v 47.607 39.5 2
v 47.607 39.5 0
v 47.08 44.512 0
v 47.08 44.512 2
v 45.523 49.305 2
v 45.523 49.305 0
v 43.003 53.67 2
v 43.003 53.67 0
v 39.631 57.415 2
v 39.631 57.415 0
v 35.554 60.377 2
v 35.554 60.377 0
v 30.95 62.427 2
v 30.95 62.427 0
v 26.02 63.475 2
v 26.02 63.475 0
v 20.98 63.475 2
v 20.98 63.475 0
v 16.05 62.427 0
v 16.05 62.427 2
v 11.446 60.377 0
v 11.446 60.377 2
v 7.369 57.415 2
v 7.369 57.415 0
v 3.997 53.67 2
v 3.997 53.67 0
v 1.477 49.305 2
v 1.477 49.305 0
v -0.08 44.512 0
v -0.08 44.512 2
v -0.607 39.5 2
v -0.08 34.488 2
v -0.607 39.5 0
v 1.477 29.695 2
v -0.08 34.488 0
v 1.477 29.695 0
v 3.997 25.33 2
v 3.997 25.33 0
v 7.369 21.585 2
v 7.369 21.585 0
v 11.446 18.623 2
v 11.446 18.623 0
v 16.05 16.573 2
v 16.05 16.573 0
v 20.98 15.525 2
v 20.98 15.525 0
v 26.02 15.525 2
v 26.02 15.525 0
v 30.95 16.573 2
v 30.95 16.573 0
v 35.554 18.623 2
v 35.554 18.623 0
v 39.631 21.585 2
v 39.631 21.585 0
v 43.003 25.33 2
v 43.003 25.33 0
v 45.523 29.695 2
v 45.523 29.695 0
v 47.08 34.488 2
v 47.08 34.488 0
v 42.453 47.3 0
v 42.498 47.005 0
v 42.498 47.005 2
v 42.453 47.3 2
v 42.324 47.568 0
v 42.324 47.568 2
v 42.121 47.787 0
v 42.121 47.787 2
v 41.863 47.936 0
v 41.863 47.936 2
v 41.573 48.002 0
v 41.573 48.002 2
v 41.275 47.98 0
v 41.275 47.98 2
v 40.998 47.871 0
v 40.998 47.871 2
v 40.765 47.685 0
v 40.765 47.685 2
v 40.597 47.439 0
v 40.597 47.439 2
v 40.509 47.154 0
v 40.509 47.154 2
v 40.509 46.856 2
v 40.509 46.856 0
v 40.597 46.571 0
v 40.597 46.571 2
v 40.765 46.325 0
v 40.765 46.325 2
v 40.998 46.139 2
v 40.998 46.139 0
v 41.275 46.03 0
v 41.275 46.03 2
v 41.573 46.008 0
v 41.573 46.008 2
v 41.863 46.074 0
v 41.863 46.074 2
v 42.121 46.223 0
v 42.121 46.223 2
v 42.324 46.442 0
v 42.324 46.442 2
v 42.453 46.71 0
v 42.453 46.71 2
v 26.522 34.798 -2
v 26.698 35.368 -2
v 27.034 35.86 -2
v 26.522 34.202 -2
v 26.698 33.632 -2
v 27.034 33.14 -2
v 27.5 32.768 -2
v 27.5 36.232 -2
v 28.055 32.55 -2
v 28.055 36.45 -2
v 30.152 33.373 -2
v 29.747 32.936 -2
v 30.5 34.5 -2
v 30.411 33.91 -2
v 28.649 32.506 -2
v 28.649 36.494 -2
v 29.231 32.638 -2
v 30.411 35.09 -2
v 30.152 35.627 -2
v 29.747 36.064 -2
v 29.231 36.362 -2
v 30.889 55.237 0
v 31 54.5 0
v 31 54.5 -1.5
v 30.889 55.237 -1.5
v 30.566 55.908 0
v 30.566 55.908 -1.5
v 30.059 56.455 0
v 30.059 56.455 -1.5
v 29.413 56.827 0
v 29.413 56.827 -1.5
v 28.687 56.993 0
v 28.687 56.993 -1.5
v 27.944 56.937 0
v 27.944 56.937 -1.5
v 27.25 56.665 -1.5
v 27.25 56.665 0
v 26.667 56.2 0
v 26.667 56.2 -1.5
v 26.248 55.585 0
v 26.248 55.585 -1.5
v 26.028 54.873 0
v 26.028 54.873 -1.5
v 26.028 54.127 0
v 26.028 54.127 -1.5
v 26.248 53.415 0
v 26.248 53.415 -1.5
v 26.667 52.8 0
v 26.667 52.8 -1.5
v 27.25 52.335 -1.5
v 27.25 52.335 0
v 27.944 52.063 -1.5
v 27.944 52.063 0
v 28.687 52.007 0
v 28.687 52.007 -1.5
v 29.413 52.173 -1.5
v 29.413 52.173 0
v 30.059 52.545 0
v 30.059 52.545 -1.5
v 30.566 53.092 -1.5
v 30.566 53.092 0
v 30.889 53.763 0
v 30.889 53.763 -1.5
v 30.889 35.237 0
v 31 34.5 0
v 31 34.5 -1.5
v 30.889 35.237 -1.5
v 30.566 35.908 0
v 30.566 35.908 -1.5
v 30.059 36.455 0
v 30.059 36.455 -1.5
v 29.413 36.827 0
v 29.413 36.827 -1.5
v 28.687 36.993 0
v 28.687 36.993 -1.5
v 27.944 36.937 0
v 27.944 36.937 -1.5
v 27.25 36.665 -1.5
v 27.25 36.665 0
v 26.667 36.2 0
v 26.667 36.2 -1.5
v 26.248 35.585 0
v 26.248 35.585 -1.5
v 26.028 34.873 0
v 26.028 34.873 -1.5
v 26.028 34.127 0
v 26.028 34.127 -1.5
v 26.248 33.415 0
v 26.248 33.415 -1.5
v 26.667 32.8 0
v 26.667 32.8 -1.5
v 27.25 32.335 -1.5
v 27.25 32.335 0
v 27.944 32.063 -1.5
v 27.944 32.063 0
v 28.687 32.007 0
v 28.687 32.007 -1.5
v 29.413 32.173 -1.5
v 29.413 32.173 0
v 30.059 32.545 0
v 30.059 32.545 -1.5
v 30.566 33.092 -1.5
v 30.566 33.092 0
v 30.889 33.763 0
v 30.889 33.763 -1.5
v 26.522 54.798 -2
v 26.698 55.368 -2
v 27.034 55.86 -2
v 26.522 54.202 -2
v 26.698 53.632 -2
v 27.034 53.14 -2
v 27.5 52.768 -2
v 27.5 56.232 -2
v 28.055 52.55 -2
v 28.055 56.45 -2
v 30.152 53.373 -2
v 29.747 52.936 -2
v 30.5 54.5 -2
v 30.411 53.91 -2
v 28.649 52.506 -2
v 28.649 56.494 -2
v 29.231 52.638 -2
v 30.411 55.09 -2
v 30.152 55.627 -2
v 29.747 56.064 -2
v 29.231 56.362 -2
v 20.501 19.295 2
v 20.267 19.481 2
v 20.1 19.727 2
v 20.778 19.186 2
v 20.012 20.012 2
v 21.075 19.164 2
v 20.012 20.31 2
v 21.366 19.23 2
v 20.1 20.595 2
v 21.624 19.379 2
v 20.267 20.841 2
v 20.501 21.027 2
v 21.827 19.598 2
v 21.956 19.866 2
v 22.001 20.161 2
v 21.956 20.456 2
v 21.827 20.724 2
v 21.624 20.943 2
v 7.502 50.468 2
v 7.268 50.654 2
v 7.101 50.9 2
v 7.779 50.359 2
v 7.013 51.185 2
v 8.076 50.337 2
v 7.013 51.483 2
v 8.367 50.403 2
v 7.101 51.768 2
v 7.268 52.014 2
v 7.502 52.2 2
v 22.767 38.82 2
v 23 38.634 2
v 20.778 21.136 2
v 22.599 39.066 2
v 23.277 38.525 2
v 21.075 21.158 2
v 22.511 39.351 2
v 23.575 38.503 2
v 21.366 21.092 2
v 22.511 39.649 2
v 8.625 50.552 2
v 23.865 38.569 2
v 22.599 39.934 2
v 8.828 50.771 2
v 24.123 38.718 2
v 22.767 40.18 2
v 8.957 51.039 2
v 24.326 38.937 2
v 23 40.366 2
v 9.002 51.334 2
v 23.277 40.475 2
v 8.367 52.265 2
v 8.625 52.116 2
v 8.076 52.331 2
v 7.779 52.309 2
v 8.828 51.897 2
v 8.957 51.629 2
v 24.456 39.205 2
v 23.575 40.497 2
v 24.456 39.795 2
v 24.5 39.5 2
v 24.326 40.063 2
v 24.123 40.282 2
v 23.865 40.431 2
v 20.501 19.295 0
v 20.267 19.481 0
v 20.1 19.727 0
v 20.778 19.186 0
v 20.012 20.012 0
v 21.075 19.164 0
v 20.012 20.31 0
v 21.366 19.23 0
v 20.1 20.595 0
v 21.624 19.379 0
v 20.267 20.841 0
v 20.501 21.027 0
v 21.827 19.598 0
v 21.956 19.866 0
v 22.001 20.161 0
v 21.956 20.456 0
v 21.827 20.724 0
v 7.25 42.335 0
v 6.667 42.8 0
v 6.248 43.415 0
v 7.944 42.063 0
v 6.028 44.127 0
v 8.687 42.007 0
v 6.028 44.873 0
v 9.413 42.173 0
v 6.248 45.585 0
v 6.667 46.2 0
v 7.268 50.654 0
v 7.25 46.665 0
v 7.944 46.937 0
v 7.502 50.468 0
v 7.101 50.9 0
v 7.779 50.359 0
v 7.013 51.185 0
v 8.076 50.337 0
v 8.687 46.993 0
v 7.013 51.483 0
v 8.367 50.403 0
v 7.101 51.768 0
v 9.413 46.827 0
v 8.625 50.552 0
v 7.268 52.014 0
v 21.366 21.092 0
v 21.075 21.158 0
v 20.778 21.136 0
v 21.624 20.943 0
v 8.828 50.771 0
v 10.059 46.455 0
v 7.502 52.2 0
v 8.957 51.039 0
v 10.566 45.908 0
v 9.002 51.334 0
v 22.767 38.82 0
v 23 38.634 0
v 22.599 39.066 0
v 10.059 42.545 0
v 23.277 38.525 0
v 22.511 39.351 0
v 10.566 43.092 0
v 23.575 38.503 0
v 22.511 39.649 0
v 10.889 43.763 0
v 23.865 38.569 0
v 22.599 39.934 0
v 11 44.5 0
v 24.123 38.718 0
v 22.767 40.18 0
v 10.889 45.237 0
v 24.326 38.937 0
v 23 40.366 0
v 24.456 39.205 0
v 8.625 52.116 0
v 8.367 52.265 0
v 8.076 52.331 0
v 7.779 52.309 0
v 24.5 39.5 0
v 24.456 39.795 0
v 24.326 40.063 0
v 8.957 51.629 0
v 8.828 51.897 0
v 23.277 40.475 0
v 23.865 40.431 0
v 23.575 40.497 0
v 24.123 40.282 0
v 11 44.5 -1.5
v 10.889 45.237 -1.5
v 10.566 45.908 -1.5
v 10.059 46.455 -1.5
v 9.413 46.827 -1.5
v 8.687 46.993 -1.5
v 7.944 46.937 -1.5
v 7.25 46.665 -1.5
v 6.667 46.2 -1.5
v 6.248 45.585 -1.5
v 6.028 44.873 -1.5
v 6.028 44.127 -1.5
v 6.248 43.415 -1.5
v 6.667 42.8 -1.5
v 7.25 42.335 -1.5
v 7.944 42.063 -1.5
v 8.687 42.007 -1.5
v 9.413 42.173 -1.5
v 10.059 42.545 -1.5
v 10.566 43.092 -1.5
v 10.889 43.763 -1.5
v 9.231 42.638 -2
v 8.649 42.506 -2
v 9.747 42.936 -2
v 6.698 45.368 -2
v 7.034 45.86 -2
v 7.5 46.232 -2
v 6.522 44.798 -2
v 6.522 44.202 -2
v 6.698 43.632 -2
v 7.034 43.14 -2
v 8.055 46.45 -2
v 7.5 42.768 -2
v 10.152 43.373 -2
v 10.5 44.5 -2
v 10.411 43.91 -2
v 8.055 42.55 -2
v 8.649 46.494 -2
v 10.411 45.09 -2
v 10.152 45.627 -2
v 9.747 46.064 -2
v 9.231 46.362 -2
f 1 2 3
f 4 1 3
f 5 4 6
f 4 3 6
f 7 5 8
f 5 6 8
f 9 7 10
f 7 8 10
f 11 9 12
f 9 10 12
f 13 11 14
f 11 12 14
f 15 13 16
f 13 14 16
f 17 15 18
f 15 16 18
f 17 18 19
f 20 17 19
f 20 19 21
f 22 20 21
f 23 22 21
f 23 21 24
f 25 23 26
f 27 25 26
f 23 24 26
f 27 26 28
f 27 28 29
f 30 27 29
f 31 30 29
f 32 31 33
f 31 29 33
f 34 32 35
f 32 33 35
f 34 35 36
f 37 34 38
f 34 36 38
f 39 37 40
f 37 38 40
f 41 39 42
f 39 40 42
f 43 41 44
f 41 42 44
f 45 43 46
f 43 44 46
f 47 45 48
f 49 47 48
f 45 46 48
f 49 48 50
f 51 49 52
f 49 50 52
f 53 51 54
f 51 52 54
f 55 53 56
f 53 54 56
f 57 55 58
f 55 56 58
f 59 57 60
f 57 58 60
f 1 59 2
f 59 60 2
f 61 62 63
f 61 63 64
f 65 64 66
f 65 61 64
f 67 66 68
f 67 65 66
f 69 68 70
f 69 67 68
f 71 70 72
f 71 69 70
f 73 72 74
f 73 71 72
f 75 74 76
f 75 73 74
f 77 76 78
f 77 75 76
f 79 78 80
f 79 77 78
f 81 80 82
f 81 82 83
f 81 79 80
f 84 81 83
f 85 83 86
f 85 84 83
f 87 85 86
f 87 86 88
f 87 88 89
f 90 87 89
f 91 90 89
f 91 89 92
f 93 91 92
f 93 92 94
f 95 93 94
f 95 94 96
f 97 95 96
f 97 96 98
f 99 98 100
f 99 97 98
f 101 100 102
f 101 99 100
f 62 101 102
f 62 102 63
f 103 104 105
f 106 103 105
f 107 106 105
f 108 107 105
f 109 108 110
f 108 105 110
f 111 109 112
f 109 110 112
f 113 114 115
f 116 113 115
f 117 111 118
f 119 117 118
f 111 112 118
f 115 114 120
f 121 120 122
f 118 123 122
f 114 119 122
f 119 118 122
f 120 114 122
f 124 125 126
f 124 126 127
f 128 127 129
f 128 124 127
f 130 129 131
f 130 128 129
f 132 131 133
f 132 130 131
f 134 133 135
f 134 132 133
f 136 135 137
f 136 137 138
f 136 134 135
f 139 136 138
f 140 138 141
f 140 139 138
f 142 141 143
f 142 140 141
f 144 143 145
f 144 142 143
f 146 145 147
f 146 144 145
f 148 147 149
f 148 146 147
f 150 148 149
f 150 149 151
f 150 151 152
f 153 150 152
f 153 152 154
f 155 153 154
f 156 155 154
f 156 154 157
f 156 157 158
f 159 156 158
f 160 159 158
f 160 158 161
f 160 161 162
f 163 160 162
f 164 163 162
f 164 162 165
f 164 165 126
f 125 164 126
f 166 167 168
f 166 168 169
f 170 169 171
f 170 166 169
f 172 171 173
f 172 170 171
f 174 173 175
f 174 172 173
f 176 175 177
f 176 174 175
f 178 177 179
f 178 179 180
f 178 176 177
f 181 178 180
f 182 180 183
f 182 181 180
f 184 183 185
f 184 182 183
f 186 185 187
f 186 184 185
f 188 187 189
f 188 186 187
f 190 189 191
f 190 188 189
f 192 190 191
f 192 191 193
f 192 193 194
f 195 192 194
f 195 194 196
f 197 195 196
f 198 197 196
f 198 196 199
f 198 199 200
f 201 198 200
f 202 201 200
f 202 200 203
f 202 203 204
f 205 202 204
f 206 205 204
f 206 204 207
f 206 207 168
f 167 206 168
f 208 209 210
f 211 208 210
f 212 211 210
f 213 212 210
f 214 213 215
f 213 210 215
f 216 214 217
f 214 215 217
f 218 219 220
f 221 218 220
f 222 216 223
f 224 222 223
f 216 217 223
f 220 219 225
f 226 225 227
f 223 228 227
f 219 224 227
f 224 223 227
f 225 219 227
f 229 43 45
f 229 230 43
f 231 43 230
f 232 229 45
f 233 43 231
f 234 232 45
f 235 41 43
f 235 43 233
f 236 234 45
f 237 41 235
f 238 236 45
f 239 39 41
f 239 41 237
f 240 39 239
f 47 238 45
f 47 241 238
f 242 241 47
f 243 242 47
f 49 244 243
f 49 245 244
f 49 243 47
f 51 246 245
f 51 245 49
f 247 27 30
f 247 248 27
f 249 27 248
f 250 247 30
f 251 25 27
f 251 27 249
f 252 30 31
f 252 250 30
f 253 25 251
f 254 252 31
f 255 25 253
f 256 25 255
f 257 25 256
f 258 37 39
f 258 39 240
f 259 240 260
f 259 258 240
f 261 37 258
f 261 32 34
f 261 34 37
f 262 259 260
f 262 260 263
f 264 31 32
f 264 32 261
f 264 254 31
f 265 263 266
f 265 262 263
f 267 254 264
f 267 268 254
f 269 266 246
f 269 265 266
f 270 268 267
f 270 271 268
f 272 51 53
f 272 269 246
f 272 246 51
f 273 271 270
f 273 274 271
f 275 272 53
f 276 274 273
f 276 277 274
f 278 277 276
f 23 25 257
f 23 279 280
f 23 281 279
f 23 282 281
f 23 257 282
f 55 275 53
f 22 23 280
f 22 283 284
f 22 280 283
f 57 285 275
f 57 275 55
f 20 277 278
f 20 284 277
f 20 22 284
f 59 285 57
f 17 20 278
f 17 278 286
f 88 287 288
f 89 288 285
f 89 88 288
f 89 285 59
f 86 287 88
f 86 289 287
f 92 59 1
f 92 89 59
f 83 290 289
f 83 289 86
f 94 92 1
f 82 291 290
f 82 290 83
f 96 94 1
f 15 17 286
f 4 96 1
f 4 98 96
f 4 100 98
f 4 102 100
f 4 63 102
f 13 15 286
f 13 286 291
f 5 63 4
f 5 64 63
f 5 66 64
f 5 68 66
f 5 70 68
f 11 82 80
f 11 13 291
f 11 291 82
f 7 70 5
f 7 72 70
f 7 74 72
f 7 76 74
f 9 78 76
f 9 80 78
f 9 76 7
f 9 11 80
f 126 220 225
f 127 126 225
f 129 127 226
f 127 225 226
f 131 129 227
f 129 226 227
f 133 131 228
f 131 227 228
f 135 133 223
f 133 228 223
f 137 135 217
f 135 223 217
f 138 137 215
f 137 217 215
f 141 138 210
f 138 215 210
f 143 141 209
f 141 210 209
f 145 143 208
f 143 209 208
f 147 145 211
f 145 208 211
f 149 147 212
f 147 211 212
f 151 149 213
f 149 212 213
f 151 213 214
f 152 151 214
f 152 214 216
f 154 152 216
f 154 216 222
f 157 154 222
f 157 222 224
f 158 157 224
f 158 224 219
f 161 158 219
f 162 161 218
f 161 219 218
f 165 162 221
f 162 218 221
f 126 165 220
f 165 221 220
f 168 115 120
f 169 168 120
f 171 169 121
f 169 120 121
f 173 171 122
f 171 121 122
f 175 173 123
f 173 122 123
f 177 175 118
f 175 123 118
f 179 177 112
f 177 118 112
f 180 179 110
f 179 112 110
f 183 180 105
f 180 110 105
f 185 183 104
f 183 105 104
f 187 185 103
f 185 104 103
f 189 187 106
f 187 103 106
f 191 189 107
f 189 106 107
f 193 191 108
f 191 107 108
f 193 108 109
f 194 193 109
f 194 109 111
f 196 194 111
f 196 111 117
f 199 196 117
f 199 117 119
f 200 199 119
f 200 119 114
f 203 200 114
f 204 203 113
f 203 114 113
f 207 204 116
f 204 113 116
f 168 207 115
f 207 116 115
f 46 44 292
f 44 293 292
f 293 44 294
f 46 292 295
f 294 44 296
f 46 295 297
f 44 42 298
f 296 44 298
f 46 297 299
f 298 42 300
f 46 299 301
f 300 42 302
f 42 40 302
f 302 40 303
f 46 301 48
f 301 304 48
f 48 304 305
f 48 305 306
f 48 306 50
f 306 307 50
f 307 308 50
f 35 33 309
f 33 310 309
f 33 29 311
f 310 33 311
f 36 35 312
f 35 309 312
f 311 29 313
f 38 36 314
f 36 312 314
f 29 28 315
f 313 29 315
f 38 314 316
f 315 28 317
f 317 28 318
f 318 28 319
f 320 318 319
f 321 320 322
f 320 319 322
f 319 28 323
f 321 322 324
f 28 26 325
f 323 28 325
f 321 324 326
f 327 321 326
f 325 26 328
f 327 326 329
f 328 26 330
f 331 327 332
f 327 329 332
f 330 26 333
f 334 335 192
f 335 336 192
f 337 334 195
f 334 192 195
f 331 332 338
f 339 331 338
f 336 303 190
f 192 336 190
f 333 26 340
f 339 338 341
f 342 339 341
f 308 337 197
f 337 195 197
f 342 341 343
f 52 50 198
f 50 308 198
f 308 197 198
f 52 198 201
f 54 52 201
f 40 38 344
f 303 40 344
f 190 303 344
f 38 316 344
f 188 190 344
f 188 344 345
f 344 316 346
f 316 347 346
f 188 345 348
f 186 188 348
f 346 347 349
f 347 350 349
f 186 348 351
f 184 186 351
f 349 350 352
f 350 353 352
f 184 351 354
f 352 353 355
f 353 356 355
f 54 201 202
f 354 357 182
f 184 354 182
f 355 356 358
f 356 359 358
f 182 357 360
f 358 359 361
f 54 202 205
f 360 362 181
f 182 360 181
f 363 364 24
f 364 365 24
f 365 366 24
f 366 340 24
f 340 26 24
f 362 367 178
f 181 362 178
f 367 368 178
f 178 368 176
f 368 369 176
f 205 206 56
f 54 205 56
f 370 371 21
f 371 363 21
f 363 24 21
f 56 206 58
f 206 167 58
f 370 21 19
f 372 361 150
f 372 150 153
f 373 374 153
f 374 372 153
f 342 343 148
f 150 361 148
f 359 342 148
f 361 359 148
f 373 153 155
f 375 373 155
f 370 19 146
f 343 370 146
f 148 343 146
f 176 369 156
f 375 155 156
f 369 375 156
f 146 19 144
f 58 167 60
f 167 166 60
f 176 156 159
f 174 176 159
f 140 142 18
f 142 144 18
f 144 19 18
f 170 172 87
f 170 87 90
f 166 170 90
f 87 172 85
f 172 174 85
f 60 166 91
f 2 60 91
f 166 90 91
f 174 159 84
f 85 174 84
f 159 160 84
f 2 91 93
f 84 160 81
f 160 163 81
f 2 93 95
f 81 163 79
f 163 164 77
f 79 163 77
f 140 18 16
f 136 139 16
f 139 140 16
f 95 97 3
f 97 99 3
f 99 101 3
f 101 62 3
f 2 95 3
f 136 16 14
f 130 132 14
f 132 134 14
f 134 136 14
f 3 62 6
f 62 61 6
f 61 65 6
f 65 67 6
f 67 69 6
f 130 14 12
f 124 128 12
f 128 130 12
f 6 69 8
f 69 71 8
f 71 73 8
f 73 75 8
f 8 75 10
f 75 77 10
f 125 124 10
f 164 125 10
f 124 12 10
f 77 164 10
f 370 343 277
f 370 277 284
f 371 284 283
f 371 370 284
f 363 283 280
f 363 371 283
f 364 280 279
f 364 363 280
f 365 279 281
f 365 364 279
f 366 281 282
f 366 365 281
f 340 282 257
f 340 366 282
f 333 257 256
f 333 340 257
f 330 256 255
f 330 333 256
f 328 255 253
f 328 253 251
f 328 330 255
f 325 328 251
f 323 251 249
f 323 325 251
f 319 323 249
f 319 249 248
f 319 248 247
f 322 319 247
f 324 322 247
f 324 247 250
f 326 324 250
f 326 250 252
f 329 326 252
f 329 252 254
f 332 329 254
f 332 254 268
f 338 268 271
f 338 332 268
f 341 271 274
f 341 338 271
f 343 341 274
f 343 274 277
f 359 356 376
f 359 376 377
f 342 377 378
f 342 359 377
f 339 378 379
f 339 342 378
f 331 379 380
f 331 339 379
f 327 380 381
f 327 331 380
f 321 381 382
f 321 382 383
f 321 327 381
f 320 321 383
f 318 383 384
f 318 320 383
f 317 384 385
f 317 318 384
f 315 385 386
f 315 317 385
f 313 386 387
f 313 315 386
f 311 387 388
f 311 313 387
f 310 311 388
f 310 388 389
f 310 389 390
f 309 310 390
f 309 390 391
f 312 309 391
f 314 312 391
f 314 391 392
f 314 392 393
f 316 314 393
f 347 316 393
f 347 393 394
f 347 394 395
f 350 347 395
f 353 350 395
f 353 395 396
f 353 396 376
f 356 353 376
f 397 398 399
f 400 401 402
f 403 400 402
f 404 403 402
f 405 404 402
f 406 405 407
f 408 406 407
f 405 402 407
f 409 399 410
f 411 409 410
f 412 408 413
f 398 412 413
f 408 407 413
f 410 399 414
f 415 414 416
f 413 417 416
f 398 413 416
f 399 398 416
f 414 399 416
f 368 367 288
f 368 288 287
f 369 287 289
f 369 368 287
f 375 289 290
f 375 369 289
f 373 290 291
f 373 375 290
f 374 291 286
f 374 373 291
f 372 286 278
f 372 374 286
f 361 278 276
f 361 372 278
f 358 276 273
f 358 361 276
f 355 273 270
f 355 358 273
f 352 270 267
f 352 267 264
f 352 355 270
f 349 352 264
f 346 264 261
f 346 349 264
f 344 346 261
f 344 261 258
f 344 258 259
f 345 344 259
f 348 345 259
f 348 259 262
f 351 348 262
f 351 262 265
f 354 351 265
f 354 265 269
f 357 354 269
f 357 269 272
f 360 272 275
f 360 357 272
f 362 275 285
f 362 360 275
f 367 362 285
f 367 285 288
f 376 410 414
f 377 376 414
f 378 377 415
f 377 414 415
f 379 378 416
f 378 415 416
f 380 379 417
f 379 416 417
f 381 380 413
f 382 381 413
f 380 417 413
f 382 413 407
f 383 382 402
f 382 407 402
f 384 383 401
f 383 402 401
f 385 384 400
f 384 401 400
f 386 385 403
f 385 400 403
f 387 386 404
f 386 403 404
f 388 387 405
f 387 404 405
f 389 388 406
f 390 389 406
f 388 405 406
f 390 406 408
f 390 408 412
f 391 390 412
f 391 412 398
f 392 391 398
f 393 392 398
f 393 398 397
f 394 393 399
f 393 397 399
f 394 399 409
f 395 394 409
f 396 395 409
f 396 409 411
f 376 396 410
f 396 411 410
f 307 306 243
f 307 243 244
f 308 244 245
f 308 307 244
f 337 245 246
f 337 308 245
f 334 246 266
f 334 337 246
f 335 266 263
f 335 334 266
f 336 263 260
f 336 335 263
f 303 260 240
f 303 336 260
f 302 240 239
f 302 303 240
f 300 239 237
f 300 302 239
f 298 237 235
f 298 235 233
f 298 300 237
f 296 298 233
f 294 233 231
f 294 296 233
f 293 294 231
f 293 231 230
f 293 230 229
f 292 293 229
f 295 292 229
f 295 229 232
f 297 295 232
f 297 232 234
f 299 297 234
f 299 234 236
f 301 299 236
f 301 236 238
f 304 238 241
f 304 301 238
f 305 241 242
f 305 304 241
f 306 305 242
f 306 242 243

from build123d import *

# Parameters (mm, degrees)
SKETCH_R     = 24.107232
SKETCH_R_2   = 1
PAD_DEPTH    = 2
SKETCH001_R  = 2.5
PAD001_DEPTH = 4
CHAMFER_SIZE = 0.5


with BuildPart() as part:
    # Sketch → Pad (new body)
    with BuildSketch(Plane.XY):
        with Locations((23.5, 39.5)):
            Circle(SKETCH_R)
        with Locations((41.497925, 47.004978)):
            Circle(SKETCH_R_2, mode=Mode.SUBTRACT)
        with Locations((8.001536, 51.334171)):
            Circle(SKETCH_R_2, mode=Mode.SUBTRACT)
        with Locations((21.000539, 20.160851)):
            Circle(SKETCH_R_2, mode=Mode.SUBTRACT)
        with Locations((23.5, 39.5)):
            Circle(SKETCH_R_2, mode=Mode.SUBTRACT)
    extrude(amount=PAD_DEPTH)

    # Sketch001 (on Face7 of Pad) → Pad001 (join)
    with BuildSketch(Plane.XY.offset(2)):
        with Locations((28.5, 34.5)):
            Circle(SKETCH001_R)
        with Locations((28.5, 54.5)):
            Circle(SKETCH001_R)
        with Locations((8.5, 44.5)):
            Circle(SKETCH001_R)
    extrude(amount=-PAD001_DEPTH)

    # Chamfer
    chamfer_edges = [part.edges().sort_by_distance(p)[0] for p in [
        (26, 34.5, -2),
        (26, 54.5, -2),
        (6, 44.5, -2),
    ]]
    chamfer(chamfer_edges, length=CHAMFER_SIZE)


solid = part.part
